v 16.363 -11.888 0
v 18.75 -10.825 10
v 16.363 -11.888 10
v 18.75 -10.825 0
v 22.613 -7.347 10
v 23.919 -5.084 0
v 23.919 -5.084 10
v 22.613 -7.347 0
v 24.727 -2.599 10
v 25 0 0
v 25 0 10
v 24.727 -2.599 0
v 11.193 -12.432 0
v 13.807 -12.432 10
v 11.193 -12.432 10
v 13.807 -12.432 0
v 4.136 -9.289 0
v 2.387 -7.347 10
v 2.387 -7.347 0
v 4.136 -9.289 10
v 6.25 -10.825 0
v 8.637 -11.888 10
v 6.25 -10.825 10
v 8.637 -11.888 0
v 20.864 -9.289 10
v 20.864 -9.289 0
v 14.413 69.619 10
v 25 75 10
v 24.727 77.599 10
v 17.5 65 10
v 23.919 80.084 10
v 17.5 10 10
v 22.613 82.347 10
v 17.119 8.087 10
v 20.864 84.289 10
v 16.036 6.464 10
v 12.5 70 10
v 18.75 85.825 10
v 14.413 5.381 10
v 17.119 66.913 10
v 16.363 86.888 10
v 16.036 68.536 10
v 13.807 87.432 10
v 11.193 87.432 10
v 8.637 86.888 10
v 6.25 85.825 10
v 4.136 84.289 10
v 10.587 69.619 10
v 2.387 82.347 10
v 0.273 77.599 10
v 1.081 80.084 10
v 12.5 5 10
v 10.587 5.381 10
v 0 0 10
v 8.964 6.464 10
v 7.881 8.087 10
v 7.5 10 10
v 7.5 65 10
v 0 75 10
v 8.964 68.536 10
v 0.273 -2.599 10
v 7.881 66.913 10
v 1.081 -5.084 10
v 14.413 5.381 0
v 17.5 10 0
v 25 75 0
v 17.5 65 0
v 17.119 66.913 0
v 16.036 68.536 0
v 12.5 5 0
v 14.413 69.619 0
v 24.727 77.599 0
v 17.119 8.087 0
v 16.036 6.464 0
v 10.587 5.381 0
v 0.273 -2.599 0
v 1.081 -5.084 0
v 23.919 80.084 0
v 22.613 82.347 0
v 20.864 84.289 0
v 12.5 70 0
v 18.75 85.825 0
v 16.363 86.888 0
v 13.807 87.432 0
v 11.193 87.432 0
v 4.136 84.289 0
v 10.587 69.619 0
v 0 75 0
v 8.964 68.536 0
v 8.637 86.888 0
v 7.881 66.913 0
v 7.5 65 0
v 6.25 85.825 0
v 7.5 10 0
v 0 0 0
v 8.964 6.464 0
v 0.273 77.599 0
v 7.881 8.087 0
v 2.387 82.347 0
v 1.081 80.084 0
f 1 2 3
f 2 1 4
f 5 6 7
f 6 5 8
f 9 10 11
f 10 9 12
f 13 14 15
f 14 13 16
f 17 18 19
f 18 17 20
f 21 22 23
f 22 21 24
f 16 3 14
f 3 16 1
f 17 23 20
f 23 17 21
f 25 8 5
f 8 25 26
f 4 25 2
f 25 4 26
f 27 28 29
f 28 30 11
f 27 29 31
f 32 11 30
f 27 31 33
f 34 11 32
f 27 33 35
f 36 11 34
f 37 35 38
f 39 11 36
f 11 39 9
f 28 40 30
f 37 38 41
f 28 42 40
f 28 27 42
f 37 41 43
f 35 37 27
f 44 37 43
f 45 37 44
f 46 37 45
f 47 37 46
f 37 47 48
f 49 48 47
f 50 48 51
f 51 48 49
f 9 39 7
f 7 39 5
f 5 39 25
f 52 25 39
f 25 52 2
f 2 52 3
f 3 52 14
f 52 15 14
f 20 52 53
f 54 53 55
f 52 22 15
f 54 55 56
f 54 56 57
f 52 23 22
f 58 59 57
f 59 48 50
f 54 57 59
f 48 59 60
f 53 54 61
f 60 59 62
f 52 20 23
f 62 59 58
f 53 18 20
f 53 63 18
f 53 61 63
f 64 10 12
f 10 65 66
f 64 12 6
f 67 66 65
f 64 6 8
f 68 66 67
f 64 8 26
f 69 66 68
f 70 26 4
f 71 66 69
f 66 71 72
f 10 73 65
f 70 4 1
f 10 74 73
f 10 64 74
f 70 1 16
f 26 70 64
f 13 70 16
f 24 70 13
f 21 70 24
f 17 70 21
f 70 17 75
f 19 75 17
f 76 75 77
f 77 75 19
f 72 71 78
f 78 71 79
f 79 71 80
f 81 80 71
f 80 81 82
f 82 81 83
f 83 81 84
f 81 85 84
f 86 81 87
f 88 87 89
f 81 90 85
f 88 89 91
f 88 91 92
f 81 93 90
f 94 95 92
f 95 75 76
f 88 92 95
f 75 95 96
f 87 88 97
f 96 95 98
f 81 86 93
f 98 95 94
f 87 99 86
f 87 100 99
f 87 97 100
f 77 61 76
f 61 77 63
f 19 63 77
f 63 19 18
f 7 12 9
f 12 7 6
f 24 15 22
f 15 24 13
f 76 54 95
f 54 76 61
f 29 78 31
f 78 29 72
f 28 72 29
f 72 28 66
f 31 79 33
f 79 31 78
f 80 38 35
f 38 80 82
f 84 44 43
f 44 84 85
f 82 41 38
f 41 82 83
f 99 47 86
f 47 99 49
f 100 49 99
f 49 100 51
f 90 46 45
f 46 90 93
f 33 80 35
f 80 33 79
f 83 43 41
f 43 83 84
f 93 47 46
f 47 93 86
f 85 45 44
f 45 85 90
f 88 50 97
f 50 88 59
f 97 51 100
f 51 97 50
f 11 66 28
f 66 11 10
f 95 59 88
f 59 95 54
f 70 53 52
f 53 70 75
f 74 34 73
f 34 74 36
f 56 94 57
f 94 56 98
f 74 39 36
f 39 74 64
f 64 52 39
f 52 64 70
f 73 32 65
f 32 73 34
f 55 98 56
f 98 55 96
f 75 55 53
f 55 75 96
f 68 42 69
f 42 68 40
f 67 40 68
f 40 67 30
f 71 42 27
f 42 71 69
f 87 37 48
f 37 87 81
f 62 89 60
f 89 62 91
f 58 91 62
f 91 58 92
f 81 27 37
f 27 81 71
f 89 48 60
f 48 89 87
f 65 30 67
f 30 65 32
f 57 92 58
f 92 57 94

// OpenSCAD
difference() {
	union() {
		translate([25/2, 0, 0]) cylinder(r = 25/2, h = 10);
		translate([25/2, 75, 0]) cylinder(r = 25/2, h = 10);
		cube([25, 75, 10]);
	}
	translate([(25 - 10) / 2, (75 - 55) /2, -0.1])
	union() {
		translate([10/2, 0, 0]) cylinder(r = 10/2, h = 10.2);
		translate([10/2, 55, 0]) cylinder(r = 10/2, h = 10.2);
		cube([10, 55, 10.2]);
	}
}
